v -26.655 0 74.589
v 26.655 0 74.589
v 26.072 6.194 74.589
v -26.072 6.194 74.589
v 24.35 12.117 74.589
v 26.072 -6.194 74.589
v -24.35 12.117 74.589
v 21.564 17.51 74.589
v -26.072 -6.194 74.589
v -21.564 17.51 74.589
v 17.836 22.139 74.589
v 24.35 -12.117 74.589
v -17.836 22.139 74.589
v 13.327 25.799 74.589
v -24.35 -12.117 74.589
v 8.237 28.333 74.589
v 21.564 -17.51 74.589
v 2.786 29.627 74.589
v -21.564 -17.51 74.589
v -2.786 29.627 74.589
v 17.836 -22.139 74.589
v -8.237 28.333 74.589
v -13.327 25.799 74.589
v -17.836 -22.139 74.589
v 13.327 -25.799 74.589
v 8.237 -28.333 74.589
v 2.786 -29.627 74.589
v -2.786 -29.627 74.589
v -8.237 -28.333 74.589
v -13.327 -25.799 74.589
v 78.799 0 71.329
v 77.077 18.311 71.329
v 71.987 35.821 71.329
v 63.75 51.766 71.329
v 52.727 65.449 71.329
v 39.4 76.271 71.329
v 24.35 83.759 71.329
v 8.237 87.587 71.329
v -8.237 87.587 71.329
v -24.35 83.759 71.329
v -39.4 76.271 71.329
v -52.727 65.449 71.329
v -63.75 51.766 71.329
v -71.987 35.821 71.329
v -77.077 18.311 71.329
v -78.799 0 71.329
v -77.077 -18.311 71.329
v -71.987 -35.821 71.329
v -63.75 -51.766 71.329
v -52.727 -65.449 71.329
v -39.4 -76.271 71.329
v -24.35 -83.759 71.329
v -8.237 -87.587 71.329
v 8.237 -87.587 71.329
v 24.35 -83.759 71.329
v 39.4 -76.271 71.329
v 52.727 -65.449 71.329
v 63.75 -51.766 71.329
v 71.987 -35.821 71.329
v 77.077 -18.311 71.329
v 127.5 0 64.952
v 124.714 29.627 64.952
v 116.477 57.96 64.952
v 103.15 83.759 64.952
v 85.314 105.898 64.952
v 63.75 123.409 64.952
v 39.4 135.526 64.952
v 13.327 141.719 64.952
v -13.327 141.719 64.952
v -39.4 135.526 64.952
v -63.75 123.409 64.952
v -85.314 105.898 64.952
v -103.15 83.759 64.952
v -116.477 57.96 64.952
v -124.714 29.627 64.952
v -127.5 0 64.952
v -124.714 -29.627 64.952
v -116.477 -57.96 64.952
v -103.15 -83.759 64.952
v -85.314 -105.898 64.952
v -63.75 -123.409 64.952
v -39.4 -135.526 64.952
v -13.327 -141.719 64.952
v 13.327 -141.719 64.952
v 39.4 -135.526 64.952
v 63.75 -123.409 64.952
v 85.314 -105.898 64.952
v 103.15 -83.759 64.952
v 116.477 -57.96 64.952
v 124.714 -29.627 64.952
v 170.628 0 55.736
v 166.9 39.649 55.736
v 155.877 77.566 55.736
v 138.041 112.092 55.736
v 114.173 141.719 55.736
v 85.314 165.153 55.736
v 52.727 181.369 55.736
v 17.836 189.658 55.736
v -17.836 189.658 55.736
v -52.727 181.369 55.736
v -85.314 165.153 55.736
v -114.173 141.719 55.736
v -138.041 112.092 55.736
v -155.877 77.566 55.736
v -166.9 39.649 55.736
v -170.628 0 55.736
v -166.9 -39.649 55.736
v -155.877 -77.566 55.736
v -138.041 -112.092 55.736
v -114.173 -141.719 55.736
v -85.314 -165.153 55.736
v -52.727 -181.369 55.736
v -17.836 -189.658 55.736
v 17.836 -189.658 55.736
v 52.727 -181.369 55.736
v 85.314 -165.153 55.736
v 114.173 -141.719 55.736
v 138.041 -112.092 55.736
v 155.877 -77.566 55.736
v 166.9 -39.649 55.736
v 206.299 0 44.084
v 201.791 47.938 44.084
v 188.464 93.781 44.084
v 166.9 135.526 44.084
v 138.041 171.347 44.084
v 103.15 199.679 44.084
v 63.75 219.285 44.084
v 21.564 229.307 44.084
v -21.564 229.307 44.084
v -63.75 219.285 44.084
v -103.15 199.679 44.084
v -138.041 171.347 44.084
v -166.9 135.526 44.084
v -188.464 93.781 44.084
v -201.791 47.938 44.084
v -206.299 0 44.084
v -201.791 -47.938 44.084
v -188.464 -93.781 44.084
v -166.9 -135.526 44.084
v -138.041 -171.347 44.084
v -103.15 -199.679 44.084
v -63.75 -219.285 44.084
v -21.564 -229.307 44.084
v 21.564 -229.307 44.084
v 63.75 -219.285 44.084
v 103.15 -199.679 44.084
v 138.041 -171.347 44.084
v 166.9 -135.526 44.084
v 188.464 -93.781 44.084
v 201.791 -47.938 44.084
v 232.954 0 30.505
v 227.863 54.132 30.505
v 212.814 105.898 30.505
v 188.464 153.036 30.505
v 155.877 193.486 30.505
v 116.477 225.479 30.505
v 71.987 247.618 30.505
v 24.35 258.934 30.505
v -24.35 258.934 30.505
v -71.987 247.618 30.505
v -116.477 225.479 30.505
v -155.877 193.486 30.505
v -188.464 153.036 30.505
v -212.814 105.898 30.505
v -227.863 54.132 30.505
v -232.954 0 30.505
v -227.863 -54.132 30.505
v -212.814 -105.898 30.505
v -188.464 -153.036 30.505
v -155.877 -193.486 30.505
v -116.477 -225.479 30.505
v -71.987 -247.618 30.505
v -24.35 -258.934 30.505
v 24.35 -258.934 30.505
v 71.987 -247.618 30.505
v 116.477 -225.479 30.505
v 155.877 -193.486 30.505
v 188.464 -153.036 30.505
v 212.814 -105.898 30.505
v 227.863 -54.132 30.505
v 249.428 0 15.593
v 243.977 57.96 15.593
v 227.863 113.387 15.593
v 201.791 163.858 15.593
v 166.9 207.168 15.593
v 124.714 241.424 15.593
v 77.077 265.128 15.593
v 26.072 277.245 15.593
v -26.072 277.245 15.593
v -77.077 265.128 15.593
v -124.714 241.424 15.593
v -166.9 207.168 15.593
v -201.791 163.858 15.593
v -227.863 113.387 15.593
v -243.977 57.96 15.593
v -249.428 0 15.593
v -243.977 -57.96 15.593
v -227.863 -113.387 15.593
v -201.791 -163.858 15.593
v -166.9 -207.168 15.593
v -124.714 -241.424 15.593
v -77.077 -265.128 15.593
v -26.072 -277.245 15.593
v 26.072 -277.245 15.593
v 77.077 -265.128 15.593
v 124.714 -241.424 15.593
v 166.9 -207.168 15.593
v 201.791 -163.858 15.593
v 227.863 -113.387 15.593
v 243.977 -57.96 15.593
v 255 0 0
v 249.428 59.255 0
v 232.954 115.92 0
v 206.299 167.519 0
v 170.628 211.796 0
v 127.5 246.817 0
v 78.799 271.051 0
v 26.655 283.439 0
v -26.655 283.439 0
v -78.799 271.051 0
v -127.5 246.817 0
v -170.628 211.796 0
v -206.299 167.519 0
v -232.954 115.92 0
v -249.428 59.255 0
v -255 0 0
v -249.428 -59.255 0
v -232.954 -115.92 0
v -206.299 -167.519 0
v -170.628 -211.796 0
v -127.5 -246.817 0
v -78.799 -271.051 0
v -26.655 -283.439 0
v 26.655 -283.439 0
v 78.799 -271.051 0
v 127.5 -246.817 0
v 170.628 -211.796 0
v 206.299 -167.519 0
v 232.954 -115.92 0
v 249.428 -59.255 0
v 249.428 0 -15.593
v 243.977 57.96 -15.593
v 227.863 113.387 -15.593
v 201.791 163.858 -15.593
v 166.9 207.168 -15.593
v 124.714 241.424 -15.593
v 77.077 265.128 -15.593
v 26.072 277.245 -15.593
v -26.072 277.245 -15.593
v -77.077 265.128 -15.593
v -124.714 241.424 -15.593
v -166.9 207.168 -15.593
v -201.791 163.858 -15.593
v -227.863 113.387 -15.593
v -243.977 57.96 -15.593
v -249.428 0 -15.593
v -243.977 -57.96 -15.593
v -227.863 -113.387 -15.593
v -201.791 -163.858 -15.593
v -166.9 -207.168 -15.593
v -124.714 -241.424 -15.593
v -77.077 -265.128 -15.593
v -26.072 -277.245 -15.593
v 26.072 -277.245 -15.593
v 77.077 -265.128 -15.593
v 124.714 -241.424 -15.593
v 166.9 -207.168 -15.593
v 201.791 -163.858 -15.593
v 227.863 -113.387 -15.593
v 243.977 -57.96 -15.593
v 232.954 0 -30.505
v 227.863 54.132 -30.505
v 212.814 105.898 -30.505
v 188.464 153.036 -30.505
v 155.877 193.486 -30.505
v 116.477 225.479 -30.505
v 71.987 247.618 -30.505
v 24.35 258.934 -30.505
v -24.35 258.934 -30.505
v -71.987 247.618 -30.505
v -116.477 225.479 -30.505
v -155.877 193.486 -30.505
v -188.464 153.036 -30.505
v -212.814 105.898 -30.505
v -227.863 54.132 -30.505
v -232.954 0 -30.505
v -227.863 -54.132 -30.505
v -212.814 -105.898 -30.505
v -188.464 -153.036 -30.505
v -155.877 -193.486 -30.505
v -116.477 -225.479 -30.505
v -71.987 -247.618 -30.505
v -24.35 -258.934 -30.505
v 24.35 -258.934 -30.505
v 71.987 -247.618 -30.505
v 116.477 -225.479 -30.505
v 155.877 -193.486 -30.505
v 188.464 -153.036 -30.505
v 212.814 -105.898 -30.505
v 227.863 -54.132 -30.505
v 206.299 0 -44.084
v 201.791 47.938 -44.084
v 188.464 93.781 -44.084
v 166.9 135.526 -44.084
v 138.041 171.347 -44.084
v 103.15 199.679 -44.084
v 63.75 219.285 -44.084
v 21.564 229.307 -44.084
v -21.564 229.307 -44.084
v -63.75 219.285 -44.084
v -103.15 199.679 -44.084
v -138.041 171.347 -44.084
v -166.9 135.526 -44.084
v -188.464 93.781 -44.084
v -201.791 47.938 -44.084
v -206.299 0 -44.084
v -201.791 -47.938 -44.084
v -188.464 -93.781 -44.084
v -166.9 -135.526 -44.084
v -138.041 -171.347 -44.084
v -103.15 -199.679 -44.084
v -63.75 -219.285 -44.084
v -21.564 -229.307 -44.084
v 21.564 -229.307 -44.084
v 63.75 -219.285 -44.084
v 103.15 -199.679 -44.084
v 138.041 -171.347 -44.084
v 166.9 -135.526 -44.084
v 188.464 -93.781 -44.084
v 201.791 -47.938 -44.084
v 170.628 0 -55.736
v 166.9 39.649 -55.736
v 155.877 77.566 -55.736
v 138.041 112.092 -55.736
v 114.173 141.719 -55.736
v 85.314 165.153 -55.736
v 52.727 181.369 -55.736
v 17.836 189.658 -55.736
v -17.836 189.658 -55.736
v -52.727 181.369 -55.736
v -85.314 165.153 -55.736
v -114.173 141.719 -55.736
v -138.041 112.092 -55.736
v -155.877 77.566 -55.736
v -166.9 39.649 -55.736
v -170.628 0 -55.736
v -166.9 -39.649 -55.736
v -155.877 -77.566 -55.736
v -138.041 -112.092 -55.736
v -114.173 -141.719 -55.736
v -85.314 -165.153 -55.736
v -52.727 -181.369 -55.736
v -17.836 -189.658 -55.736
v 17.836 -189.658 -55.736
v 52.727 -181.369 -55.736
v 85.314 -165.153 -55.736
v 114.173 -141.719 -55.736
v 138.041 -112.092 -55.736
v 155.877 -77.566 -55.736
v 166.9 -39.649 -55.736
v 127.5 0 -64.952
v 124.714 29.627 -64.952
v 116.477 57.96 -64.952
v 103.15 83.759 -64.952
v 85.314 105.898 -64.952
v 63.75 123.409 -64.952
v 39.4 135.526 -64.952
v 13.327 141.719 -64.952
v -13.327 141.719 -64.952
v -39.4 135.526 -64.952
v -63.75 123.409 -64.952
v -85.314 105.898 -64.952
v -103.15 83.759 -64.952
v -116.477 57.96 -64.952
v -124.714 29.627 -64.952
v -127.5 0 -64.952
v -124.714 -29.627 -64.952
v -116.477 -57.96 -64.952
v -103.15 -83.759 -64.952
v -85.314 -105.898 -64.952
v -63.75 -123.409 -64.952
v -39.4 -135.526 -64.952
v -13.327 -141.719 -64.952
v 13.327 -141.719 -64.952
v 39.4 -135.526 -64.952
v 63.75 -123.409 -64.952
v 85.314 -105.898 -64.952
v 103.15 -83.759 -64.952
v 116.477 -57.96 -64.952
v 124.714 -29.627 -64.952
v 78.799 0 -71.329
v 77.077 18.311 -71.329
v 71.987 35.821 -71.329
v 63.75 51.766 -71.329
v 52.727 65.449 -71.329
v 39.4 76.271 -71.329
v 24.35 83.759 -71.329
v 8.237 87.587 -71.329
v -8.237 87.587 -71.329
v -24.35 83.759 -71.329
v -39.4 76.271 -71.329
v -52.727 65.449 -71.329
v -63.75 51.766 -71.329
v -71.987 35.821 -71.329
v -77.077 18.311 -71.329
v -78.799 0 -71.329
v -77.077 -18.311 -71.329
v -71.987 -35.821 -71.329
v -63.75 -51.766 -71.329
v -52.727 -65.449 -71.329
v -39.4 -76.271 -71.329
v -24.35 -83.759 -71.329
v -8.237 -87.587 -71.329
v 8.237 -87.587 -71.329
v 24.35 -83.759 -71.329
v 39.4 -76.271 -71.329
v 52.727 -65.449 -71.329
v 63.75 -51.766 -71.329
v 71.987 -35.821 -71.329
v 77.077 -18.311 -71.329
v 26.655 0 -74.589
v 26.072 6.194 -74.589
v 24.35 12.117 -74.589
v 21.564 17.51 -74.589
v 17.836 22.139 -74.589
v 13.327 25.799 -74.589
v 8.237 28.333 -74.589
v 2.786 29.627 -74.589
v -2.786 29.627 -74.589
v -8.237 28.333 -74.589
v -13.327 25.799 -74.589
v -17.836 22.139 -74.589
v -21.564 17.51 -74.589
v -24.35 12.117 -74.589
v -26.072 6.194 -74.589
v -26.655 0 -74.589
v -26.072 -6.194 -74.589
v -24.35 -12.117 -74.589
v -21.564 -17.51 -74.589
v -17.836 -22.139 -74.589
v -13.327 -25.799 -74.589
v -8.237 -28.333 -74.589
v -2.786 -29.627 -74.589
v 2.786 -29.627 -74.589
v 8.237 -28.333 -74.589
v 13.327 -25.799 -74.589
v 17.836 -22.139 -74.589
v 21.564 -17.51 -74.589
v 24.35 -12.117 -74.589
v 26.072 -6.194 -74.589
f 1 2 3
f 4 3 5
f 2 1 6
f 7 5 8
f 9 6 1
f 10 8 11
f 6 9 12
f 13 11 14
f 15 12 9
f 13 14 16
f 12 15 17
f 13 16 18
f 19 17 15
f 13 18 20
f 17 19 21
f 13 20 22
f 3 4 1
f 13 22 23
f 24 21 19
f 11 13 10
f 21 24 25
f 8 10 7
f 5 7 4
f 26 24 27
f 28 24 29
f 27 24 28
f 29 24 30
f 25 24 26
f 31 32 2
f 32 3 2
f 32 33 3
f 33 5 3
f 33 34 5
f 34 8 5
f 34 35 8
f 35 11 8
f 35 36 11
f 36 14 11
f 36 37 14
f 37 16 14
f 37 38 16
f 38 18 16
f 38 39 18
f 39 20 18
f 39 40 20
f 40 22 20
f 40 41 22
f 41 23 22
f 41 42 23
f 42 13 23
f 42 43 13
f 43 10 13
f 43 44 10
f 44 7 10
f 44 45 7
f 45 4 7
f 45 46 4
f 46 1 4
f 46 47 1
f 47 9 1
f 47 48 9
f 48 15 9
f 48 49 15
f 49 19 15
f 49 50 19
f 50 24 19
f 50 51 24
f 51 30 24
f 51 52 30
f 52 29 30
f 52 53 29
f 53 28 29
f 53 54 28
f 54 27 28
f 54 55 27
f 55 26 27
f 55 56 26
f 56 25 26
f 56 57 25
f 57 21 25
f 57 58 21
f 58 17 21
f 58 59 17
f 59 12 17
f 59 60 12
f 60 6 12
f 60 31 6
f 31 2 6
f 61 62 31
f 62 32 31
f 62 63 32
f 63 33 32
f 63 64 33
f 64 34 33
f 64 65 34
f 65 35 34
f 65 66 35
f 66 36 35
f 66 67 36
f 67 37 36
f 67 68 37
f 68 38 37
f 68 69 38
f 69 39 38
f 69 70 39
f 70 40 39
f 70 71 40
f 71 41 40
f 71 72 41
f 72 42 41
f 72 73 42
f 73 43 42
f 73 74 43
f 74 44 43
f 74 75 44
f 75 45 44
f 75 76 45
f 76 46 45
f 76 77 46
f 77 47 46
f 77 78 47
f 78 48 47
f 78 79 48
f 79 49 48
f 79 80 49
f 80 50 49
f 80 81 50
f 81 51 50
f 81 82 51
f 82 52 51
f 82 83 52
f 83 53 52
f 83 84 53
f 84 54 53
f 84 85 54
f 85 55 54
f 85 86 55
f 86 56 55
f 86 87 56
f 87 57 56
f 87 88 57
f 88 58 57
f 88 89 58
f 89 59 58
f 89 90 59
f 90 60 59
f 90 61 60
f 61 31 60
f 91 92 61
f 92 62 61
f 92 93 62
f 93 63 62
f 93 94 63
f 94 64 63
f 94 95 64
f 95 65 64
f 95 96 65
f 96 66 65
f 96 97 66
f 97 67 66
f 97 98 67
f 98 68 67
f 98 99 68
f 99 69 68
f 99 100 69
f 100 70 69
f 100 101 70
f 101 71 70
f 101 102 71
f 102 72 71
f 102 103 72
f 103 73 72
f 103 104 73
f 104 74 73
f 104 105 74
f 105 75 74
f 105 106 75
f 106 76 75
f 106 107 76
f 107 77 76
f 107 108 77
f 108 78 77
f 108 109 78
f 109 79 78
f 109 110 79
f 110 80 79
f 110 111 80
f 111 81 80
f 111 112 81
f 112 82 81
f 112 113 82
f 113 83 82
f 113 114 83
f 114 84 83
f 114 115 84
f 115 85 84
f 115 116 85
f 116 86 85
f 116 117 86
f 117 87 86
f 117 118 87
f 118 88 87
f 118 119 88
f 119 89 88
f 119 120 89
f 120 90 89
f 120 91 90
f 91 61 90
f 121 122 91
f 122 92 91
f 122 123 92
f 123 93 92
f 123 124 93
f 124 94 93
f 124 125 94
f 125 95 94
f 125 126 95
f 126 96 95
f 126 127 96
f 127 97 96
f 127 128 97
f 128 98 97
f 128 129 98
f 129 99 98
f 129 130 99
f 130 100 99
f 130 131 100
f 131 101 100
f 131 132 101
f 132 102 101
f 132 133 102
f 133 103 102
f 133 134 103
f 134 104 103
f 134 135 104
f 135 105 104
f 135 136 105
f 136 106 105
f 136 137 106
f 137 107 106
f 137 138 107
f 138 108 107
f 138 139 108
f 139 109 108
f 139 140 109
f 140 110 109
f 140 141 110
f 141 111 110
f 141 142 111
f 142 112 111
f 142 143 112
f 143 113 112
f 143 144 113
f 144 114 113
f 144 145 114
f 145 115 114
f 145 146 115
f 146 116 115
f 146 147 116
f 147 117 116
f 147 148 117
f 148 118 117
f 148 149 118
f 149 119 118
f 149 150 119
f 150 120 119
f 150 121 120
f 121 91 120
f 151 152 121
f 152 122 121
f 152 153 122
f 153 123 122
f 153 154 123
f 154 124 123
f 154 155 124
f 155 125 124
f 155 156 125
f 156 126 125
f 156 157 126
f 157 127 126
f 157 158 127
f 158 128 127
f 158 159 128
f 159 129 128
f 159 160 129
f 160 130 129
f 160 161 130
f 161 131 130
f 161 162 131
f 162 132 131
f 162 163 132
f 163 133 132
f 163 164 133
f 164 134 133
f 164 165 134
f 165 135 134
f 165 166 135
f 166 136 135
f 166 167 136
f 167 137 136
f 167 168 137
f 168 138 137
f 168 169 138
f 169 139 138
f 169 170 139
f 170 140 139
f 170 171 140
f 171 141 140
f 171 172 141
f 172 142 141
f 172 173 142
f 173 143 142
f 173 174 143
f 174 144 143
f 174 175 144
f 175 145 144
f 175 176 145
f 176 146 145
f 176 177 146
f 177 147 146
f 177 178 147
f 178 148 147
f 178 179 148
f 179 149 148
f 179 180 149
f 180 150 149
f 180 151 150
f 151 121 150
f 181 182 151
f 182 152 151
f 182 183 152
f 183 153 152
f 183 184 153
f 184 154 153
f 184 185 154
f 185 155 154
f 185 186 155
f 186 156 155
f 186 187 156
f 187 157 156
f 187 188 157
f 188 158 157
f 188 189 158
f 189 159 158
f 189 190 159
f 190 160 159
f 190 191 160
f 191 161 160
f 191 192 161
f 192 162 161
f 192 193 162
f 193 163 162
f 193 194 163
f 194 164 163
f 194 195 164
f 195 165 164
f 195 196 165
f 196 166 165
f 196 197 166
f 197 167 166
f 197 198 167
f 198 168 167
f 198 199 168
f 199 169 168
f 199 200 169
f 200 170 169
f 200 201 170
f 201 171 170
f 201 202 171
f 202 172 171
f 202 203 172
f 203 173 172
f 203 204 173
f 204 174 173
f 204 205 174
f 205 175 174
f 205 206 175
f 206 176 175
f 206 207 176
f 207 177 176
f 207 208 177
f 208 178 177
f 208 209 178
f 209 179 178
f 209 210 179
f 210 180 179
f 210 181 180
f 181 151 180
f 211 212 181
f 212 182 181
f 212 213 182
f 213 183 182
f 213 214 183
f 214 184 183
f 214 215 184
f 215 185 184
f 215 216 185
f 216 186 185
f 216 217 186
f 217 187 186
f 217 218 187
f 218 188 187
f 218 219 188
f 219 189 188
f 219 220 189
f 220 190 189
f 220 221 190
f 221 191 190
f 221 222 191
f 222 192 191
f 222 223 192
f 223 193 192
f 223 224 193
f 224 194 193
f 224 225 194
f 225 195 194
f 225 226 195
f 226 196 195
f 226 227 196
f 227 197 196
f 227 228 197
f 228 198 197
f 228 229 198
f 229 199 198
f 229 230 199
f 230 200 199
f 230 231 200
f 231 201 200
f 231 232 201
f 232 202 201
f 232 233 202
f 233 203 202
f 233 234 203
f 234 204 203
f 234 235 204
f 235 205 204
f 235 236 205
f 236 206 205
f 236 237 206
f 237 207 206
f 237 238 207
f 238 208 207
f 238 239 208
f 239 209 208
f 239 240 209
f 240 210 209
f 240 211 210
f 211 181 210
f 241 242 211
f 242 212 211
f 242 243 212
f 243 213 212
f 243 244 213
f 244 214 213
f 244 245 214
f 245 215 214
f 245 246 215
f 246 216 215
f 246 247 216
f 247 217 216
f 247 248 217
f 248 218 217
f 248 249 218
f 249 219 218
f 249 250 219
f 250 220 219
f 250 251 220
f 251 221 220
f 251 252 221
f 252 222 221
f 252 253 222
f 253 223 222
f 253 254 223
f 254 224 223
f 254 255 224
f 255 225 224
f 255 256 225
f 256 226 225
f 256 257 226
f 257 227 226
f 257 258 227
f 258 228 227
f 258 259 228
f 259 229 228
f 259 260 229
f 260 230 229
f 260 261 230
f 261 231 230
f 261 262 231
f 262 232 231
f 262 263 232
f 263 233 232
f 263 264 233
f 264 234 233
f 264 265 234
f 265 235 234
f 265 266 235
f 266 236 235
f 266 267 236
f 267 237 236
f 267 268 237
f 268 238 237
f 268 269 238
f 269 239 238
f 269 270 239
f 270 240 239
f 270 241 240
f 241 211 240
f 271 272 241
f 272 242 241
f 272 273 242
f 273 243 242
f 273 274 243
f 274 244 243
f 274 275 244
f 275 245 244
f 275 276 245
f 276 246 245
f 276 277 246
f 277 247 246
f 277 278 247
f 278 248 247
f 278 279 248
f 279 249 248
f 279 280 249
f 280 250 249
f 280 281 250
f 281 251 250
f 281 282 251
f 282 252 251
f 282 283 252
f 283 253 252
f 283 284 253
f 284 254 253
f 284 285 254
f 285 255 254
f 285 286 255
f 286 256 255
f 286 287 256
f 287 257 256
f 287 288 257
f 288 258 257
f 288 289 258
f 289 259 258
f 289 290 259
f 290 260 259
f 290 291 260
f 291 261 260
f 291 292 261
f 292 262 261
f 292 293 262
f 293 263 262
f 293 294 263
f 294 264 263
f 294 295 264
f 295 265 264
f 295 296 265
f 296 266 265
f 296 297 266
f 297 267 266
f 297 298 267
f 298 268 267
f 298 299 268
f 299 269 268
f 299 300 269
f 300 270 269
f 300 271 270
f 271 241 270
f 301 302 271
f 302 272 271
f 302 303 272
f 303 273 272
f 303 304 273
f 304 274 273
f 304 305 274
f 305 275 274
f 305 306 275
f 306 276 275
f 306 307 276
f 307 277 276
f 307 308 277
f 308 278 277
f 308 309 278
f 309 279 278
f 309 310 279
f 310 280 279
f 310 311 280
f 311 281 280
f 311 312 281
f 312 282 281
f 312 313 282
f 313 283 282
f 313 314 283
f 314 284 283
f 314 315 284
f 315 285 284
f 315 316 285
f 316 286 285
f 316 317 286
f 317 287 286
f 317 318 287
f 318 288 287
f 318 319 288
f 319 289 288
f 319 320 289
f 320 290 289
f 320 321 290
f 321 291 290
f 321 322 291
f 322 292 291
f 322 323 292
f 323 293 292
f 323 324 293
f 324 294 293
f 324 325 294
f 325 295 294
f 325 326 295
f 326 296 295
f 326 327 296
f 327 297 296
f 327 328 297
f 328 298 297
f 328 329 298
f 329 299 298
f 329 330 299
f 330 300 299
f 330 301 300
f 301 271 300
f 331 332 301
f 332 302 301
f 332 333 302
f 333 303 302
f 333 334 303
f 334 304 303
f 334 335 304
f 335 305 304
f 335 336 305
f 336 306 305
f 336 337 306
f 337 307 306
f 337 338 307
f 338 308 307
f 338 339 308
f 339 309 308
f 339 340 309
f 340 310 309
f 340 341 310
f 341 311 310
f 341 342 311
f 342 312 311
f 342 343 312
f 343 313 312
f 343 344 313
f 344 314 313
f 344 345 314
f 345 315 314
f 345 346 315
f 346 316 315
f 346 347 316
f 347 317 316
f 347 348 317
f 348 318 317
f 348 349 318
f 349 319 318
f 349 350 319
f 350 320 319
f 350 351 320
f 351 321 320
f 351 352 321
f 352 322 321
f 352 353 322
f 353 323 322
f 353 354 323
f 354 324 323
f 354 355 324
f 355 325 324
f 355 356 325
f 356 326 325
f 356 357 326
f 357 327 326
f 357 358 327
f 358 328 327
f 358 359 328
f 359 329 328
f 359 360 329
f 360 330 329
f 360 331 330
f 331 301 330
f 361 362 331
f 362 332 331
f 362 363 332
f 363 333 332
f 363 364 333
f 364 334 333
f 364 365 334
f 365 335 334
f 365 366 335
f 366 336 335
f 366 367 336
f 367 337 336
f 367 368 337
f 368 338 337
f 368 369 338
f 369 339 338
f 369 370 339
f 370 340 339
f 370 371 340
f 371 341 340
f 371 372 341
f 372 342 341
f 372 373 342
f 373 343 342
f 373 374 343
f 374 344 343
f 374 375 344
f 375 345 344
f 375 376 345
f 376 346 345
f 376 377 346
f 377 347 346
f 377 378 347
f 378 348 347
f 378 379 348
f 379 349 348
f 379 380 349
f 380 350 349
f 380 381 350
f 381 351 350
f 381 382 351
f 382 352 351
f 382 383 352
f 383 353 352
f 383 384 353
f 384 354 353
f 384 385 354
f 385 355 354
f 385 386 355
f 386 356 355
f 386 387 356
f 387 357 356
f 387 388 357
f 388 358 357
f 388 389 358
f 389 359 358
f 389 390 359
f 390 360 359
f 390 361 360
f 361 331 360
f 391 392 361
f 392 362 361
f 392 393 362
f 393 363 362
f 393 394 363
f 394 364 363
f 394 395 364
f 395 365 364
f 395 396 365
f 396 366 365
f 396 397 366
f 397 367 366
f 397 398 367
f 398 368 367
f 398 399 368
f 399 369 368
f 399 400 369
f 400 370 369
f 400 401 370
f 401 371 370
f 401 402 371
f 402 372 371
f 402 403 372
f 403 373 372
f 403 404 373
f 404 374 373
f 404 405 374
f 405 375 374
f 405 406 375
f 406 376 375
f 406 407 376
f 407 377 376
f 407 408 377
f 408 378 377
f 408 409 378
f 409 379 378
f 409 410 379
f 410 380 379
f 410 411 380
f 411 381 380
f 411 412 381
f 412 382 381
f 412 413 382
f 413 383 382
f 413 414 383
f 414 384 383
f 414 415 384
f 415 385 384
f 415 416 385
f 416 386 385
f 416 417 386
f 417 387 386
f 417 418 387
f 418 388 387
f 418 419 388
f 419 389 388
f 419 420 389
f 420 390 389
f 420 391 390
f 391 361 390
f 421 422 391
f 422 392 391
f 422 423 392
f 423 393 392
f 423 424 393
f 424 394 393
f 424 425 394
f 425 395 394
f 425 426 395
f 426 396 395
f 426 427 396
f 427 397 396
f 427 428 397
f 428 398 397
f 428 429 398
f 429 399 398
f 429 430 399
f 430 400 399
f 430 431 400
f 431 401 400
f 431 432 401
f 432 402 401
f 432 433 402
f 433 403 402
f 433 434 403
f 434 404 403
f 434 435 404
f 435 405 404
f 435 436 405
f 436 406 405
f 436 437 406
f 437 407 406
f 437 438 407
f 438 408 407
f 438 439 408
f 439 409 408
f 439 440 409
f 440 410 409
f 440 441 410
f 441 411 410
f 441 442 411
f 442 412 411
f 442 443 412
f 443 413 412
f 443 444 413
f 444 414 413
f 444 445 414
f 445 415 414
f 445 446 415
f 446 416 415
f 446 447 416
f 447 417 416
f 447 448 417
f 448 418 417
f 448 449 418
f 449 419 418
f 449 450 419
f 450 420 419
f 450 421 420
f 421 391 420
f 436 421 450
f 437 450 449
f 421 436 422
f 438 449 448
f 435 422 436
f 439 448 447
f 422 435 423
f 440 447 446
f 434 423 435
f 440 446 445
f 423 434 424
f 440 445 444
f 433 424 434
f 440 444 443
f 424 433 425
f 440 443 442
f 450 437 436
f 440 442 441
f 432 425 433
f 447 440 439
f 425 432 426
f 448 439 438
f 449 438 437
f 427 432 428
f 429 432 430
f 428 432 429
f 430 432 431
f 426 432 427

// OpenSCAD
// Generated by SolidPython 1.0.1 on 2020-07-29 00:46:53


scale(v = [17, 19, 5]) {
	sphere(r = 15);
}
/***********************************************
*********      SolidPython code:      **********
************************************************
 
# import packages: SolidPython
from solid import *
from solid.utils import *
from itertools import chain, combinations, permutations


class Resize:

    def __init__(self, scad_file):
        self.scad_file = scad_file
        #self.scad_file = import_scad(scad_file)
        # cone/cylinder param:
        self.r1 = 0
        self.r2 = 0
        self.h = 0
        # rectangular prism param:
        self.w = 0
        self.l = 0
        # ellipse param:
        self.r = 0

    # import OpenScad code (file name corresponds to shape)


    # classify shape + parameters
    def assign(self, param1, param2, param3):
        if self.scad_file == 'cone.scad':
            self.r1 = param1
            self.r2 = param2
            self.h = param3
        elif self.scad_file == 'cylinder.scad':
            self.r1 = param1
            self.r2 = param2
            self.h = param3
        elif self.scad_file == 'rectangularPrism.scad':
            self.h = param1
            self.l = param2
            self.w = param3
        else:
            self.r = param1
            self.h = param2

    # resize parameters
    def iterate(self):
        x = range(3, 20, 2)
        i = 1
        if self.scad_file == 'cone.scad':
            tempList = list(permutations(x, 2))
            for temp in tempList:
                param1 = temp[0]
                param2 = temp[1]
                filepath = 'produced_scad_files/' + 'cone' + str(param1) + '_' + str(param2) + '_' + '.scad'
                scad_render_to_file(cylinder(h=param1, r1=param2, r2=0), filepath)

        elif self.scad_file == 'cylinder.scad':
            tempList = list(permutations(x, 3))
            for temp in tempList:
                param1 = temp[0]
                param2 = temp[1]
                filepath = 'produced_scad_files/' + 'cylinder' + str(param1) + '_' + str(param2) + '_' + '.scad'
                scad_render_to_file(cylinder(h=param1, r1=param2, r2=param2), filepath)

        elif self.scad_file == 'rectangularPrism.scad':
            tempList = list(permutations(x, 3))
            for temp in tempList:
                param1 = temp[0]
                param2 = temp[1]
                param3 = temp[2]
                filepath = 'produced_scad_files/' + 'rectangularPrism' + str(param1) + '_' + str(param2) + '_' + str(
                    param3) + '.scad'
                scad_render_to_file(cube(size=(param1, param2, param3)), filepath)

        elif self.scad_file == 'ellipse.scad':
            tempList = list(permutations(x, 4))
            for temp in tempList:
                param1 = temp[0]
                param2 = temp[1]
                param3 = temp[2]
                param4 = temp[3]
                filepath = 'produced_scad_files/' + 'ellipse' + str(param1) + '_' + str(param2) + '_' + str(param3) + '_' + str(param4) + '.scad'
                scad_render_to_file(scale([param1, param2, param3])(sphere(r=param4)), filepath)

    def render_to_scadfile(self):
        scad_render_to_file(scad, 'example.scad') 
 
************************************************/
